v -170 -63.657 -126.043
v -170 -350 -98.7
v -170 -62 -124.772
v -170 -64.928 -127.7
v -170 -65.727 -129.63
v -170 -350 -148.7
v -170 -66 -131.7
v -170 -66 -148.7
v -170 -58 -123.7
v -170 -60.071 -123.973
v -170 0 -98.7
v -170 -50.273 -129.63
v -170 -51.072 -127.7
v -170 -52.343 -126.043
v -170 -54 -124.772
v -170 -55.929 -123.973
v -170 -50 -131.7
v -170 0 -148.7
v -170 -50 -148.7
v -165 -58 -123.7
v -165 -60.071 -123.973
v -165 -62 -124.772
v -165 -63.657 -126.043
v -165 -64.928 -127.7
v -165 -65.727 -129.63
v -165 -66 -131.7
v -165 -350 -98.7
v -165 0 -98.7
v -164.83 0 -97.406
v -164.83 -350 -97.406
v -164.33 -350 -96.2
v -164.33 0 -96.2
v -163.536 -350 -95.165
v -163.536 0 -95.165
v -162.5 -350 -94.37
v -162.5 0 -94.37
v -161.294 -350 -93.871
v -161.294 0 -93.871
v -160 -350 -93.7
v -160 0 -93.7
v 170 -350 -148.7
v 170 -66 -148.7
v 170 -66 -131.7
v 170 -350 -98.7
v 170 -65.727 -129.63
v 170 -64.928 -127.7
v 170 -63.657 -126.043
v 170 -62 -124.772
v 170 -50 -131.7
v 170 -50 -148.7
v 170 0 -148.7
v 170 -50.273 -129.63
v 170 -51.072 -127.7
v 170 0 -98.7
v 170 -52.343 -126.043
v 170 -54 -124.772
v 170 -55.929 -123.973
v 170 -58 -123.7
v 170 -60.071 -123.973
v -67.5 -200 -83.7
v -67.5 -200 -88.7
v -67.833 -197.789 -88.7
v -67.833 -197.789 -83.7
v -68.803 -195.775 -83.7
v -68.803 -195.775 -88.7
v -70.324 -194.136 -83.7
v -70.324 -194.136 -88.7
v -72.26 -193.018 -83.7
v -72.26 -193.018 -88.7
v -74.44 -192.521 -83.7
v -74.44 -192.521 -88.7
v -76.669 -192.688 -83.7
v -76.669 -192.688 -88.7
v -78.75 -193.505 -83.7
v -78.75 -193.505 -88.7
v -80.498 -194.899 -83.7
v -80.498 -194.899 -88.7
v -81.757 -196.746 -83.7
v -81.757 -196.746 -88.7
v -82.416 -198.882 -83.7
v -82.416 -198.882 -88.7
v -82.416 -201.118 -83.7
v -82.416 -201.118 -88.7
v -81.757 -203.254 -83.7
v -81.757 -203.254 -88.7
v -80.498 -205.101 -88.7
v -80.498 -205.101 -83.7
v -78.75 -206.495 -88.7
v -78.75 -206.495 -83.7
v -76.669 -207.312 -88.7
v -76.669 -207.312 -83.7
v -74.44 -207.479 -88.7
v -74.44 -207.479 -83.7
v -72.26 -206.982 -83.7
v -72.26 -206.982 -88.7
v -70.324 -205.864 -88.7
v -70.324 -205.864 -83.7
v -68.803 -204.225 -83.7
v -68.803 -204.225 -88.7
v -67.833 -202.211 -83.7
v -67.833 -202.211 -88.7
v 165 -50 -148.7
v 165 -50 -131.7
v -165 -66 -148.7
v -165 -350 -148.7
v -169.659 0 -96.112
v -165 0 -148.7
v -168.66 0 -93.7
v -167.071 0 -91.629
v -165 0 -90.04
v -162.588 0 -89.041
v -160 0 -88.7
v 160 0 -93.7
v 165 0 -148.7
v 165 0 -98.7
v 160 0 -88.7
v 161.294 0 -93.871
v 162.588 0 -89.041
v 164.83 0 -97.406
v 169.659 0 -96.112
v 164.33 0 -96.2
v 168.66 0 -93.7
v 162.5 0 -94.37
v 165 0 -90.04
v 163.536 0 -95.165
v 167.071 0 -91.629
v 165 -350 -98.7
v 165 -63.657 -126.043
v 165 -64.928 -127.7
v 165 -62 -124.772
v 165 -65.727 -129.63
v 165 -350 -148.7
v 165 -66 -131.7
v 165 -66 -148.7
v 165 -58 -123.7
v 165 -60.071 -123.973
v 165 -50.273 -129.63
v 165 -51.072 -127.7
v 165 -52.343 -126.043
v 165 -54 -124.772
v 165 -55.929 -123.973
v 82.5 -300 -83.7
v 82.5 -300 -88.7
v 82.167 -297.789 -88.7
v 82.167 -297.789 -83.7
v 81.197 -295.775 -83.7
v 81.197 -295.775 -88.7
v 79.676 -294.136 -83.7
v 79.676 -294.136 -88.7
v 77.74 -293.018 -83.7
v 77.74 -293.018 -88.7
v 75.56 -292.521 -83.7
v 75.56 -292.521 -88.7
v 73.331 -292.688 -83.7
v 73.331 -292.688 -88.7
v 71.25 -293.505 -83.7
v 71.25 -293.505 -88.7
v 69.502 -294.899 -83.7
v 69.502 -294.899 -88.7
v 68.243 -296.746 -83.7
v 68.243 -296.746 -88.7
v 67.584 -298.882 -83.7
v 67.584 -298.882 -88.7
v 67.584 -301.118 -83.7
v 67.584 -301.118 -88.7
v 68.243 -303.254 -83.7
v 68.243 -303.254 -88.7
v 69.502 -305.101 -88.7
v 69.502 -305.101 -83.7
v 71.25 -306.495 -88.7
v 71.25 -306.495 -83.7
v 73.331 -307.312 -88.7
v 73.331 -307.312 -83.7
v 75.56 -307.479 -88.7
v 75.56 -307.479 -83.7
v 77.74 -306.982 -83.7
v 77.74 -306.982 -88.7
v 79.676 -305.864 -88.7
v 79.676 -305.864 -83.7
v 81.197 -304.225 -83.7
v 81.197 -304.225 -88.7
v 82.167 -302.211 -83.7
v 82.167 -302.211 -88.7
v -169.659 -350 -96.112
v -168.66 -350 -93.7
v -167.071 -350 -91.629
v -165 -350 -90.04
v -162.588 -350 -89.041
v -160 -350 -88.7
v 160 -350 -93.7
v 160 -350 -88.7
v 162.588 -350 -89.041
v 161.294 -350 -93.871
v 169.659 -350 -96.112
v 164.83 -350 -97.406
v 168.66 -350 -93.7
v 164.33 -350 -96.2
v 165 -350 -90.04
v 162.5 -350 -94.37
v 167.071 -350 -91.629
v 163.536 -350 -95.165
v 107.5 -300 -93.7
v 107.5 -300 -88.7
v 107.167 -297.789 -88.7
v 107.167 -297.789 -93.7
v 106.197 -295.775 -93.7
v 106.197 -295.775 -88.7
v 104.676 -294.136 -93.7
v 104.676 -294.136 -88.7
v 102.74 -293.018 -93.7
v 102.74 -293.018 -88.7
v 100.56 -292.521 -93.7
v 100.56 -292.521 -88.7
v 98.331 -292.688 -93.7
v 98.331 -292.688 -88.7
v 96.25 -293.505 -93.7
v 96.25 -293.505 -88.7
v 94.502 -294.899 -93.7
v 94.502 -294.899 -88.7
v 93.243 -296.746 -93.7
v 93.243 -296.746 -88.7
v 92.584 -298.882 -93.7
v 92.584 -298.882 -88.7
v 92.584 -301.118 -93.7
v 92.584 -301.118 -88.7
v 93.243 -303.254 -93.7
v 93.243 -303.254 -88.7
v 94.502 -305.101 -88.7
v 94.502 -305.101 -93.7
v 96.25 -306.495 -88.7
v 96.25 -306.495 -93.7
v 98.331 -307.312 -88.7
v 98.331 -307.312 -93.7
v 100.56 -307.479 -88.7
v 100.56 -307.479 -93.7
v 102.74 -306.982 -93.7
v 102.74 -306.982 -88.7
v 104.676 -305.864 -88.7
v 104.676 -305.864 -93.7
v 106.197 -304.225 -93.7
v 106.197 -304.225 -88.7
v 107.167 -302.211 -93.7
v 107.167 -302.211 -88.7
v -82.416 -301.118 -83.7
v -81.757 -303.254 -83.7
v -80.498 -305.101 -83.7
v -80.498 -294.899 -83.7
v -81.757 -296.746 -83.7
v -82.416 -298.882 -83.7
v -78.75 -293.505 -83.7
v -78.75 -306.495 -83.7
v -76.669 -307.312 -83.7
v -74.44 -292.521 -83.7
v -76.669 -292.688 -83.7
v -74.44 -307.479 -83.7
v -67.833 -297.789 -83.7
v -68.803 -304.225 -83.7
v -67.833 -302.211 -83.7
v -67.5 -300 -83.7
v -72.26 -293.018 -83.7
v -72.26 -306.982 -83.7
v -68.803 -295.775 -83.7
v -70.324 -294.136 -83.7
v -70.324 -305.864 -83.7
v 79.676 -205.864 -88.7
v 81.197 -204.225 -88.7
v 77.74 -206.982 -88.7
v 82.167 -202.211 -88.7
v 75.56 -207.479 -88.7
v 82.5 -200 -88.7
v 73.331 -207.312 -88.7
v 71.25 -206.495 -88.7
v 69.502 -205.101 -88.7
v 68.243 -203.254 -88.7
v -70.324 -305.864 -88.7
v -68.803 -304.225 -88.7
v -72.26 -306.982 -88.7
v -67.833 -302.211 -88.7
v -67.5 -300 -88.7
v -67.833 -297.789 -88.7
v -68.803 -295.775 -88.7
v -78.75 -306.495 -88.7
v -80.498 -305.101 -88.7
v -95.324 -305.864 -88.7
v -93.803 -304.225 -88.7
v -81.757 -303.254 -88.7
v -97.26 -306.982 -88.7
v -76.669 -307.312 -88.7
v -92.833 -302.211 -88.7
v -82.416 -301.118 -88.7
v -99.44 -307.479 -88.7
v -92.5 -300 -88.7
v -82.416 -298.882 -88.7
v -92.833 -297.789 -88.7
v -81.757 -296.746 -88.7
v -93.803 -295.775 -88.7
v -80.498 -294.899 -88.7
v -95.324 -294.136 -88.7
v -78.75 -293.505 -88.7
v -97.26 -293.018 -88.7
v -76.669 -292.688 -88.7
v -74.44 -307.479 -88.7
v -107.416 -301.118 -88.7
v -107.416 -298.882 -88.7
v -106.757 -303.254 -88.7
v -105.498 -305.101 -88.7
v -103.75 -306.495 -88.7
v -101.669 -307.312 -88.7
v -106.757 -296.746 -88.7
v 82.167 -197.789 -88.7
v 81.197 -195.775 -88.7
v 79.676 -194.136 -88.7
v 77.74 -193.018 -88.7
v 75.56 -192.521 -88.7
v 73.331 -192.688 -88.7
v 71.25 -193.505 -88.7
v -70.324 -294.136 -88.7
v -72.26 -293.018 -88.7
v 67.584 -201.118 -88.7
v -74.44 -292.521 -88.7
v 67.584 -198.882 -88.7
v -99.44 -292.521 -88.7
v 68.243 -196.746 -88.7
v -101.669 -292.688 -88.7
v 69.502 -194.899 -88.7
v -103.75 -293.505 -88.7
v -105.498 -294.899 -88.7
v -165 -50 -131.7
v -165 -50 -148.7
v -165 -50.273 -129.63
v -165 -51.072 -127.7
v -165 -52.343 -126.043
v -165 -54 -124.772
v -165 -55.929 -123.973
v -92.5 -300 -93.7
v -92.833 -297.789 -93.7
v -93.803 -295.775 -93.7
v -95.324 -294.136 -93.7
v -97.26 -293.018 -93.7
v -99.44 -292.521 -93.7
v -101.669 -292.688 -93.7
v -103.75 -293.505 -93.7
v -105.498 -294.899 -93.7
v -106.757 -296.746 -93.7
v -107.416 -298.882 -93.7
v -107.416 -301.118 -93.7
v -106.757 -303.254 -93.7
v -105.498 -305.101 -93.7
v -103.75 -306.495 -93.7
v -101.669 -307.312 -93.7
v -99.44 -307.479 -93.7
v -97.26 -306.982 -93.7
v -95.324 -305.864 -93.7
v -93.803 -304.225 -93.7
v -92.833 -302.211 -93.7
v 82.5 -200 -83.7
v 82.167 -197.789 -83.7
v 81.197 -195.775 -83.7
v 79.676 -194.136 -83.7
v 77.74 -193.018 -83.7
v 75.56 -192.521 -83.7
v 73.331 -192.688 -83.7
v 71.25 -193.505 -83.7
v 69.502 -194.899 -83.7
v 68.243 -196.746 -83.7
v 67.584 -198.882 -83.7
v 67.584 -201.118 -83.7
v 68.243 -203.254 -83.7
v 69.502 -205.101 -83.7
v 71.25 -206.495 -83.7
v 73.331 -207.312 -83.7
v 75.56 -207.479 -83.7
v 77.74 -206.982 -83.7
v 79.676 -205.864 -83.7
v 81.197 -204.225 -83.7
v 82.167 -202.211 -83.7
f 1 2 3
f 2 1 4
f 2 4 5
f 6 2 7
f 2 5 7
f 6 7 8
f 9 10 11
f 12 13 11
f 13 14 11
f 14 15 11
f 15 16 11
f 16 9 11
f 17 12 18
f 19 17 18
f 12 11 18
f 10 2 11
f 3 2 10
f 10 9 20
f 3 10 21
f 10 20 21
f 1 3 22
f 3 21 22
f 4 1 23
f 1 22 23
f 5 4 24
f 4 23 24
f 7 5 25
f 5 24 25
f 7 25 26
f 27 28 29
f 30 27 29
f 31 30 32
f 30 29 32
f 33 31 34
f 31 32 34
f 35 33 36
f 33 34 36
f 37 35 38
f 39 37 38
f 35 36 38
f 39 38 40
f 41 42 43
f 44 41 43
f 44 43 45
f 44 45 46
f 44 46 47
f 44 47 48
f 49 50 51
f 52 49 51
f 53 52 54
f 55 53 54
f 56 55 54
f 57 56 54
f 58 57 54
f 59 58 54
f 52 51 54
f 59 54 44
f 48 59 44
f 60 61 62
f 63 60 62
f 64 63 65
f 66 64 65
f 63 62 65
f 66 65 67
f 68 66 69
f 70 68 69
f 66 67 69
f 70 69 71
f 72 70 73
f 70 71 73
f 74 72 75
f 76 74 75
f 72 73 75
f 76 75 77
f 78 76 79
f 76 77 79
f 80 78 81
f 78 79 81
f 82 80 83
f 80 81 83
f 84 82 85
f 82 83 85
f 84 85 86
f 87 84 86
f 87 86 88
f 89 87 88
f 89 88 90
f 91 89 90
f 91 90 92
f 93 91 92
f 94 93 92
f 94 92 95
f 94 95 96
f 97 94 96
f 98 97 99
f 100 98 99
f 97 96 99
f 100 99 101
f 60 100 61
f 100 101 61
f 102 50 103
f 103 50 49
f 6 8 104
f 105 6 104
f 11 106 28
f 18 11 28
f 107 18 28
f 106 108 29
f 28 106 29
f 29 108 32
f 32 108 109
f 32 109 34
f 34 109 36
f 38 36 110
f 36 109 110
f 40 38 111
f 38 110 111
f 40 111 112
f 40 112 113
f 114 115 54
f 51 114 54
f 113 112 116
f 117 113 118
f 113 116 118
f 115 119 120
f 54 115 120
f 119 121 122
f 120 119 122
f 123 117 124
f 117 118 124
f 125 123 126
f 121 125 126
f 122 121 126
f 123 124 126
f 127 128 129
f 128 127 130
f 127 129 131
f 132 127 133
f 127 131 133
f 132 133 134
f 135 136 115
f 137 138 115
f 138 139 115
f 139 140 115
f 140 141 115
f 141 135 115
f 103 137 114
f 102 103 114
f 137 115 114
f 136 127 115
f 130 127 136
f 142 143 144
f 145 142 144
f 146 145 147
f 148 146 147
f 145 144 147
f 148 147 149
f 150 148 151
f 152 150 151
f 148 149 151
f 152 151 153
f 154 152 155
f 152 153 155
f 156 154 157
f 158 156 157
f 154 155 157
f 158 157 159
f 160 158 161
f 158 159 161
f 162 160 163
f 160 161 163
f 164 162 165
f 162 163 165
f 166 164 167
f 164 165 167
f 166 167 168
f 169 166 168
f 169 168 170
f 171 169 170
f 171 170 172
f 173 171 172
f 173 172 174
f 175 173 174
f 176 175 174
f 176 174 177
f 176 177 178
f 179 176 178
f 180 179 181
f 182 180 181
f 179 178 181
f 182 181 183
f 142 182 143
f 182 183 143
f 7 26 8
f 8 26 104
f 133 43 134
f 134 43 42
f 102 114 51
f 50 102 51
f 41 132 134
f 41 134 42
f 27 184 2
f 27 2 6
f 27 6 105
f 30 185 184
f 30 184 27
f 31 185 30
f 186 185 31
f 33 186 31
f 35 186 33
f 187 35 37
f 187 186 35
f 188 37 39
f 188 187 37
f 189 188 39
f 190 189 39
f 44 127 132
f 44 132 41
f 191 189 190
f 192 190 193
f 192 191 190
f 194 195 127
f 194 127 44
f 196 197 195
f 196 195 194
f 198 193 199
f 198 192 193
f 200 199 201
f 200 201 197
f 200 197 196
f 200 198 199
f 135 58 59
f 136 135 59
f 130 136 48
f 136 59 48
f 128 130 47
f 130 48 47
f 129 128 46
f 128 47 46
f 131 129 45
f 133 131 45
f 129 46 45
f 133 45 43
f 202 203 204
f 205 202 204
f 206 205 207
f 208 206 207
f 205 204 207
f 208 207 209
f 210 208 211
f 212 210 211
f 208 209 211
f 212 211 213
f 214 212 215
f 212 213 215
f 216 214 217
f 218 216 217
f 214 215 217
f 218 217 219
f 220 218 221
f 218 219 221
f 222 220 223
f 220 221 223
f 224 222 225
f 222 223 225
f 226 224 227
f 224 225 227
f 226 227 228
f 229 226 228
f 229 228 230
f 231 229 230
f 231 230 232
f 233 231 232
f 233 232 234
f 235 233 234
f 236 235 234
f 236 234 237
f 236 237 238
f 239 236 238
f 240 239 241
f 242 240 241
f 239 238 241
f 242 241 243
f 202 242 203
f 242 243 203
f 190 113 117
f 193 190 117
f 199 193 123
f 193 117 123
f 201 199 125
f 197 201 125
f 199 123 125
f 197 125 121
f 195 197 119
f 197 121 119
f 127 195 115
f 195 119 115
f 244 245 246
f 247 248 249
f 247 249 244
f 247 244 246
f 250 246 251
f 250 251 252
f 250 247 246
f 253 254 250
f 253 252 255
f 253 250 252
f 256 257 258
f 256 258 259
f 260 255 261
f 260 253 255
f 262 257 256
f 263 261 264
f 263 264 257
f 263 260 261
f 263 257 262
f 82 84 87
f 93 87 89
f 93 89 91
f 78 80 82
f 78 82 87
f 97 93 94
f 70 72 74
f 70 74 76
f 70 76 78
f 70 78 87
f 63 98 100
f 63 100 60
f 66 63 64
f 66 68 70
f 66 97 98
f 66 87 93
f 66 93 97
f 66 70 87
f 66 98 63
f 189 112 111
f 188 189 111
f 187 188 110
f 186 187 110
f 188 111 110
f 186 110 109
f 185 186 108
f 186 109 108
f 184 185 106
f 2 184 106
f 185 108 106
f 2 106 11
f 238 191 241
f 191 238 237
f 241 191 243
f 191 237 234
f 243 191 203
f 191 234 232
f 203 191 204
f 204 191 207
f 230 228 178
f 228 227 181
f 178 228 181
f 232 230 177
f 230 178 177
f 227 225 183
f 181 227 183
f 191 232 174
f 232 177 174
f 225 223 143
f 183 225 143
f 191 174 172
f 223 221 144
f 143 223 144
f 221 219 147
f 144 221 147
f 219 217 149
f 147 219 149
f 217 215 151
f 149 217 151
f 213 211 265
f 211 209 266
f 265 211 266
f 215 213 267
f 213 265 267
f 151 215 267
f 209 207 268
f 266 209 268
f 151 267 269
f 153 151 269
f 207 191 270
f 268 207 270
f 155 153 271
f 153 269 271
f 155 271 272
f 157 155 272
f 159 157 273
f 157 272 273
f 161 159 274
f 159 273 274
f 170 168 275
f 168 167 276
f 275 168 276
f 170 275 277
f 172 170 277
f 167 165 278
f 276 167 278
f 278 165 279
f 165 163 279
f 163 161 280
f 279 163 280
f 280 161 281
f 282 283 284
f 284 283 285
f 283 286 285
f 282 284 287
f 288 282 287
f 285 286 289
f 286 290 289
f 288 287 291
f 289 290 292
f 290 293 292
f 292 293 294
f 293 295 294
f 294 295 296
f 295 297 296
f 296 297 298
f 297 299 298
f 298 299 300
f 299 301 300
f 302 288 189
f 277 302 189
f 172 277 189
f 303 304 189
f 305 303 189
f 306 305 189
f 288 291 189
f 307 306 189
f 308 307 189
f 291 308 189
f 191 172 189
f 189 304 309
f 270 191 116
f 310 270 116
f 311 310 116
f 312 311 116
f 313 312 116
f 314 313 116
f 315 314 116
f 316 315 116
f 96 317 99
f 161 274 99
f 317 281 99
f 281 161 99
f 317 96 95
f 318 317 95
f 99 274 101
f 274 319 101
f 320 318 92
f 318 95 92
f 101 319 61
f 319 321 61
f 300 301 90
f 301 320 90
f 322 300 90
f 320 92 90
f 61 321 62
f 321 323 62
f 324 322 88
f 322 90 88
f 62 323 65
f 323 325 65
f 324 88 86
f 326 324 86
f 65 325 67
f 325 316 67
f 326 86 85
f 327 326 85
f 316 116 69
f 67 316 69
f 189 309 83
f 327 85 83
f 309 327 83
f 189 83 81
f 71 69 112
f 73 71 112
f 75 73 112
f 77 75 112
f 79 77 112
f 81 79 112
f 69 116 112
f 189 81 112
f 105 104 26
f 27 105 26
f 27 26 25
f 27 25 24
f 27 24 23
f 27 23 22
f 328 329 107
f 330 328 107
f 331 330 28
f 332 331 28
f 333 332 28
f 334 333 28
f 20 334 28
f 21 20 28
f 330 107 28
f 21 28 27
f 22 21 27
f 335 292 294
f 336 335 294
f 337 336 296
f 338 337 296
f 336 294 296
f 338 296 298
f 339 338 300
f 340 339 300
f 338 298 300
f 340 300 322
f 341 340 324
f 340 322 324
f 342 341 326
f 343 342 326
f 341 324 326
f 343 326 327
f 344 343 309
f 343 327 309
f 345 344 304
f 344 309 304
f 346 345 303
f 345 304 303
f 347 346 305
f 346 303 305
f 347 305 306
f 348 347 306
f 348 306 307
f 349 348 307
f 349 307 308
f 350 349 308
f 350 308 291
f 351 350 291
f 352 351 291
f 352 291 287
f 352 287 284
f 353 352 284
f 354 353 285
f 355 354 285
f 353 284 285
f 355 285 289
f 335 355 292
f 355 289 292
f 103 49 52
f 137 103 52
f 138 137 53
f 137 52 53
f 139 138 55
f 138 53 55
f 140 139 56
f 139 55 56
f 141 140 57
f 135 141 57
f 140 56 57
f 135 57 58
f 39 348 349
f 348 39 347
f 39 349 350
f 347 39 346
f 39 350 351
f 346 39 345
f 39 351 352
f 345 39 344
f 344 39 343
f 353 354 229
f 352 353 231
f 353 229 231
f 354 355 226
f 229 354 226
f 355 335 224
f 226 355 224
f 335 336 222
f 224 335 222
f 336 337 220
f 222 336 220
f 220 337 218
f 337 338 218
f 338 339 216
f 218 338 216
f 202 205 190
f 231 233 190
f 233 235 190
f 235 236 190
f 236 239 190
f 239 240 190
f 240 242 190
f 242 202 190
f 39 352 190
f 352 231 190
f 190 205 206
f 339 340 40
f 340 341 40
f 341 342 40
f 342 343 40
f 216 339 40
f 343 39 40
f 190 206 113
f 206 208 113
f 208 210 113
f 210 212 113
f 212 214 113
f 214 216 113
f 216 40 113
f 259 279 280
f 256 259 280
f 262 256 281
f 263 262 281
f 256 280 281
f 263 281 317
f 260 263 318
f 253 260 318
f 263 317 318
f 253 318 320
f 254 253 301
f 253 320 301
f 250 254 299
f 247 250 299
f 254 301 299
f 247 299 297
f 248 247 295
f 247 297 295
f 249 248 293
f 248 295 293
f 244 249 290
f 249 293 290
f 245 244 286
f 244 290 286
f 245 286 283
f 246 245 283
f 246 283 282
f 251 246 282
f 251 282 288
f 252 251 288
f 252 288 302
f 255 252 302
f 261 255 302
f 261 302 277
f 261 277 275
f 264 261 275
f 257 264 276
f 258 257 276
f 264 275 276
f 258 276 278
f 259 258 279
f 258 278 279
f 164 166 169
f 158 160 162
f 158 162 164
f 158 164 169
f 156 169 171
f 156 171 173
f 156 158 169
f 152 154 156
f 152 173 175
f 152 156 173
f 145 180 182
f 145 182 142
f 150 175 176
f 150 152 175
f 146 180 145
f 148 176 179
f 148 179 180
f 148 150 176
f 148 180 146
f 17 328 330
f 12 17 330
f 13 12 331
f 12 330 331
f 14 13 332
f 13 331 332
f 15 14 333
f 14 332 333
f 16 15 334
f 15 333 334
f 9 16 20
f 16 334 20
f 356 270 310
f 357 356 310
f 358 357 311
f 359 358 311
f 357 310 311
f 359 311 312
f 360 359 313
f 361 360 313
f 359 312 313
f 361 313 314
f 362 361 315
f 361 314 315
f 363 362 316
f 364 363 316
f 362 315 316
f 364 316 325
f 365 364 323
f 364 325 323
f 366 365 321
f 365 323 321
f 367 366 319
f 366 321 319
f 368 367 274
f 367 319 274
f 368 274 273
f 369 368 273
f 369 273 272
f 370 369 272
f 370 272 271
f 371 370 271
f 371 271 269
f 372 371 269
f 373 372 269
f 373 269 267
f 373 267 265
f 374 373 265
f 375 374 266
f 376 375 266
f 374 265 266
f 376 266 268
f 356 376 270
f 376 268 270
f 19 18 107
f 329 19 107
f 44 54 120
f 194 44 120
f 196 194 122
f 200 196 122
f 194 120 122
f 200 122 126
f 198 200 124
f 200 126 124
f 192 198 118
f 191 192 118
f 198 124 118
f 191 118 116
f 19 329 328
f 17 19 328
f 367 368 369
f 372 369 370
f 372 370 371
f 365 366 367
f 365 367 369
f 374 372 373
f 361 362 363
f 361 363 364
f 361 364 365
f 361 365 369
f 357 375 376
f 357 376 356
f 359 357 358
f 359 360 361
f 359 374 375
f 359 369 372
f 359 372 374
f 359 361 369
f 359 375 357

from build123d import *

# Parameters (mm, degrees)
F1_DEPTH = 350
F3_DEPTH = 340.0010036672
F4_R     = 7.5
F5_DEPTH = 5
F6_R     = 7.5
F7_DEPTH = 5


# Not quite as in the source:
# - ends of sketch curves that miss each other by under 0.0002 mm in the source are joined


with BuildPart() as f1:
    # F0 (on Front) → F1 (new body)
    with BuildSketch(Plane.XZ):
        with BuildLine():
            Line((160, -88.7002011906), (-160.0000036672, -88.7002011906))
            ThreePointArc((-160.0000036672, -88.7002011906), (-167.0710714791, -91.6291333788), (-170.0000036672, -98.7002011906))
            Line((-170.0000036672, -98.7002011906), (-170, -148.7002011906))
            Line((-170, -148.7002011906), (-165.0000036672, -148.7002011906))
            Line((-165.0000036672, -148.7002011906), (-165.0000036672, -98.7002011906))
            ThreePointArc((-165.0000036672, -98.7002011906), (-163.5355375731, -95.1646672847), (-160.0000036672, -93.7002011906))
            Line((-160.0000036672, -93.7002011906), (160, -93.7002011906))
            ThreePointArc((160, -93.7002011906), (163.5355339059, -95.1646672847), (165, -98.7002011906))
            Line((165, -98.7002011906), (165, -148.7002011906))
            Line((165, -148.7002011906), (170, -148.7002011906))
            Line((170, -148.7002011906), (170, -98.7002011906))
            ThreePointArc((170, -98.7002011906), (167.0710678119, -91.6291333788), (160, -88.7002011906))
        make_face()
    extrude(amount=F1_DEPTH)

    # F2 (on face) → F3 (cut, through all)
    with BuildSketch(Plane.YZ.offset(170)):
        with BuildLine():
            Line((-66, -148.7002011906), (-50, -148.7002011906))
            Line((-50, -148.7002011906), (-50, -131.7002011906))
            ThreePointArc((-50, -131.7002011906), (-52.3431457505, -126.0433469411), (-58, -123.7002011906))
            ThreePointArc((-58, -123.7002011906), (-63.6568542495, -126.0433469411), (-66, -131.7002011906))
            Line((-66, -131.7002011906), (-66, -148.7002011906))
        make_face()
    extrude(amount=-F3_DEPTH, mode=Mode.SUBTRACT)

    # F4 (on face) → F5 (cut, through all)
    with BuildSketch(Plane.XY.offset(-88.7002011906)):
        with Locations((-100, -300)):
            Circle(F4_R)
        with Locations((100, -300)):
            Circle(F4_R)
    extrude(amount=-F5_DEPTH, mode=Mode.SUBTRACT)

    # F6 (on face) → F7 (join)
    with BuildSketch(Plane.XY.offset(-88.7002011906)):
        with Locations((-75, -200)):
            Circle(F6_R)
        with Locations((-75, -300)):
            Circle(F6_R)
        with Locations((75, -300)):
            Circle(F6_R)
        with Locations((75, -200)):
            Circle(F6_R)
    extrude(amount=F7_DEPTH)


solid = f1.part
